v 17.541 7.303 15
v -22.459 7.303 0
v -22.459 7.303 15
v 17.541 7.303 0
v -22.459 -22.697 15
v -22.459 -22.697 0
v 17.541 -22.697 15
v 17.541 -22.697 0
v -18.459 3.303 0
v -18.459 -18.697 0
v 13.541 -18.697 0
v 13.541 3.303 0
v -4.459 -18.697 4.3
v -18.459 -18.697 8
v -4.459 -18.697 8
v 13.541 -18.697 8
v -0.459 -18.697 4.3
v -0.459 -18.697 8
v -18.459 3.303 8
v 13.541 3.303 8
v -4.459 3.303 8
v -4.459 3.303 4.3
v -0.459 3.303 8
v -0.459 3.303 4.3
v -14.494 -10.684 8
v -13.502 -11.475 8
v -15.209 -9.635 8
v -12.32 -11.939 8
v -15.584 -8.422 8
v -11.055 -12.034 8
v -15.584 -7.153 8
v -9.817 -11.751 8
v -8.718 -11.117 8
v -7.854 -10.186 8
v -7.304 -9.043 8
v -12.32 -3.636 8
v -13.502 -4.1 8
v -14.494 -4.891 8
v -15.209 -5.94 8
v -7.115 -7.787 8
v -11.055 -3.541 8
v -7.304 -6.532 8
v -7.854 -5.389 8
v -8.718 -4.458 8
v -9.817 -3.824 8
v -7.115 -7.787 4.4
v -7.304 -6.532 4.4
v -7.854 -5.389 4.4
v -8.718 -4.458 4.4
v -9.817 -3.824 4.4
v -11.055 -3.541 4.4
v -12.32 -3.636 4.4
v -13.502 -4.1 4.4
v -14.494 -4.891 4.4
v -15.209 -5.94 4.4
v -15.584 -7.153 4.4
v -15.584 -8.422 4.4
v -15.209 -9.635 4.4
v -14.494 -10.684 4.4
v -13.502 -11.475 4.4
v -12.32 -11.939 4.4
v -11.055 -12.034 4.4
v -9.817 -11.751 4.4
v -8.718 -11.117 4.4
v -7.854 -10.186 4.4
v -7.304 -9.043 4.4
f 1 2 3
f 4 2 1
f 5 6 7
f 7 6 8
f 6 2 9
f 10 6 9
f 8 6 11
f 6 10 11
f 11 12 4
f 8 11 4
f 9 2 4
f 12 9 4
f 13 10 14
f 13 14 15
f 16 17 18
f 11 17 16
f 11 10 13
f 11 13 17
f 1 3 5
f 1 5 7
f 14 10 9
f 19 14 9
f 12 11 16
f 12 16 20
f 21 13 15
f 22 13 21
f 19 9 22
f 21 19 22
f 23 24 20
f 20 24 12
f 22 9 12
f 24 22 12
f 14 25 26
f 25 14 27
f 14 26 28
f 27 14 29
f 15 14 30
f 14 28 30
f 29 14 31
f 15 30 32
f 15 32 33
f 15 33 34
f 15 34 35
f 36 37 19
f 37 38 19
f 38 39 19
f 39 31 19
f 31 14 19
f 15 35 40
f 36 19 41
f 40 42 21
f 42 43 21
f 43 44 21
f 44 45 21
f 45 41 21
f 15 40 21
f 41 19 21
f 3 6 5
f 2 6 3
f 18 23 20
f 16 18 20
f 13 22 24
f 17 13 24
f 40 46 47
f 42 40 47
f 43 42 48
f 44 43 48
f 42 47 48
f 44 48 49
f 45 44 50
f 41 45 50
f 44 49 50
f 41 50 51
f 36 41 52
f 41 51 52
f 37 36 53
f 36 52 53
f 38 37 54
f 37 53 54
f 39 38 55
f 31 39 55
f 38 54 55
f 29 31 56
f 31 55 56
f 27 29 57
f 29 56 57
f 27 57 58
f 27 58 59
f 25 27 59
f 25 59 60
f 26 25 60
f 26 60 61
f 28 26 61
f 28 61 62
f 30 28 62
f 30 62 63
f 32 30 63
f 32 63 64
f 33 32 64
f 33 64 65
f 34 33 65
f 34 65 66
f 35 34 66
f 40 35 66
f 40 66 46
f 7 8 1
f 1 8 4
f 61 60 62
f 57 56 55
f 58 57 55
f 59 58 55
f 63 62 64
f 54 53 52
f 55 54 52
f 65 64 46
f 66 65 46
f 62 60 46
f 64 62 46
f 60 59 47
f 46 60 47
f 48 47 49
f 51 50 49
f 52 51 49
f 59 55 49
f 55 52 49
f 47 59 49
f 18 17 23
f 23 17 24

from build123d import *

# Parameters (mm, degrees)
F0_W     = 40
F0_H     = 30
F0_W_2   = 14
F0_H_2   = 22
F0_R     = 4.2582963086
F0_W_3   = 4
F1_DEPTH = 15
F2_DEPTH = 8
F3_DEPTH = 4.4
F4_DEPTH = 4.3


with BuildPart() as f1:
    # F0 (on Top) → F1 (new body)
    with BuildSketch(Plane.XY):
        with Locations((-2.458587151, -7.6971892889)):
            Rectangle(F0_W, F0_H)
        Polygon((-18.458587151, -18.6971892889), (-18.458587151, 3.3028107111), (-4.458587151, 3.3028107111), (-0.458587151, 3.3028107111), (13.541412849, 3.3028107111), (13.541412849, -18.6971892889), (-0.458587151, -18.6971892889), (-4.458587151, -18.6971892889), align=None, mode=Mode.SUBTRACT)
        with Locations((-11.458587151, -7.6971892889)):
            Rectangle(F0_W_2, F0_H_2)
        with Locations((-11.3728679717, -7.7874381095)):
            Circle(F0_R, mode=Mode.SUBTRACT)
        with Locations((6.541412849, -7.6971892889)):
            Rectangle(F0_W_2, F0_H_2)
        with Locations((-2.458587151, -7.6971892889)):
            Rectangle(F0_W_3, F0_H_2)
        with Locations((-11.3728679717, -7.7874381095)):
            Circle(F0_R)
    extrude(amount=F1_DEPTH)

    # F0 (on Top) → F2 (cut)
    with BuildSketch(Plane.XY):
        with Locations((6.541412849, -7.6971892889)):
            Rectangle(F0_W_2, F0_H_2)
        with Locations((-11.458587151, -7.6971892889)):
            Rectangle(F0_W_2, F0_H_2)
        with Locations((-11.3728679717, -7.7874381095)):
            Circle(F0_R, mode=Mode.SUBTRACT)
    extrude(amount=F2_DEPTH, mode=Mode.SUBTRACT)

    # F0 (on Top) → F3 (cut)
    with BuildSketch(Plane.XY):
        with Locations((-11.3728679717, -7.7874381095)):
            Circle(F0_R)
    extrude(amount=F3_DEPTH, mode=Mode.SUBTRACT)

    # F0 (on Top) → F4 (cut)
    with BuildSketch(Plane.XY):
        with Locations((-2.458587151, -7.6971892889)):
            Rectangle(F0_W_3, F0_H_2)
    extrude(amount=F4_DEPTH, mode=Mode.SUBTRACT)


solid = f1.part
